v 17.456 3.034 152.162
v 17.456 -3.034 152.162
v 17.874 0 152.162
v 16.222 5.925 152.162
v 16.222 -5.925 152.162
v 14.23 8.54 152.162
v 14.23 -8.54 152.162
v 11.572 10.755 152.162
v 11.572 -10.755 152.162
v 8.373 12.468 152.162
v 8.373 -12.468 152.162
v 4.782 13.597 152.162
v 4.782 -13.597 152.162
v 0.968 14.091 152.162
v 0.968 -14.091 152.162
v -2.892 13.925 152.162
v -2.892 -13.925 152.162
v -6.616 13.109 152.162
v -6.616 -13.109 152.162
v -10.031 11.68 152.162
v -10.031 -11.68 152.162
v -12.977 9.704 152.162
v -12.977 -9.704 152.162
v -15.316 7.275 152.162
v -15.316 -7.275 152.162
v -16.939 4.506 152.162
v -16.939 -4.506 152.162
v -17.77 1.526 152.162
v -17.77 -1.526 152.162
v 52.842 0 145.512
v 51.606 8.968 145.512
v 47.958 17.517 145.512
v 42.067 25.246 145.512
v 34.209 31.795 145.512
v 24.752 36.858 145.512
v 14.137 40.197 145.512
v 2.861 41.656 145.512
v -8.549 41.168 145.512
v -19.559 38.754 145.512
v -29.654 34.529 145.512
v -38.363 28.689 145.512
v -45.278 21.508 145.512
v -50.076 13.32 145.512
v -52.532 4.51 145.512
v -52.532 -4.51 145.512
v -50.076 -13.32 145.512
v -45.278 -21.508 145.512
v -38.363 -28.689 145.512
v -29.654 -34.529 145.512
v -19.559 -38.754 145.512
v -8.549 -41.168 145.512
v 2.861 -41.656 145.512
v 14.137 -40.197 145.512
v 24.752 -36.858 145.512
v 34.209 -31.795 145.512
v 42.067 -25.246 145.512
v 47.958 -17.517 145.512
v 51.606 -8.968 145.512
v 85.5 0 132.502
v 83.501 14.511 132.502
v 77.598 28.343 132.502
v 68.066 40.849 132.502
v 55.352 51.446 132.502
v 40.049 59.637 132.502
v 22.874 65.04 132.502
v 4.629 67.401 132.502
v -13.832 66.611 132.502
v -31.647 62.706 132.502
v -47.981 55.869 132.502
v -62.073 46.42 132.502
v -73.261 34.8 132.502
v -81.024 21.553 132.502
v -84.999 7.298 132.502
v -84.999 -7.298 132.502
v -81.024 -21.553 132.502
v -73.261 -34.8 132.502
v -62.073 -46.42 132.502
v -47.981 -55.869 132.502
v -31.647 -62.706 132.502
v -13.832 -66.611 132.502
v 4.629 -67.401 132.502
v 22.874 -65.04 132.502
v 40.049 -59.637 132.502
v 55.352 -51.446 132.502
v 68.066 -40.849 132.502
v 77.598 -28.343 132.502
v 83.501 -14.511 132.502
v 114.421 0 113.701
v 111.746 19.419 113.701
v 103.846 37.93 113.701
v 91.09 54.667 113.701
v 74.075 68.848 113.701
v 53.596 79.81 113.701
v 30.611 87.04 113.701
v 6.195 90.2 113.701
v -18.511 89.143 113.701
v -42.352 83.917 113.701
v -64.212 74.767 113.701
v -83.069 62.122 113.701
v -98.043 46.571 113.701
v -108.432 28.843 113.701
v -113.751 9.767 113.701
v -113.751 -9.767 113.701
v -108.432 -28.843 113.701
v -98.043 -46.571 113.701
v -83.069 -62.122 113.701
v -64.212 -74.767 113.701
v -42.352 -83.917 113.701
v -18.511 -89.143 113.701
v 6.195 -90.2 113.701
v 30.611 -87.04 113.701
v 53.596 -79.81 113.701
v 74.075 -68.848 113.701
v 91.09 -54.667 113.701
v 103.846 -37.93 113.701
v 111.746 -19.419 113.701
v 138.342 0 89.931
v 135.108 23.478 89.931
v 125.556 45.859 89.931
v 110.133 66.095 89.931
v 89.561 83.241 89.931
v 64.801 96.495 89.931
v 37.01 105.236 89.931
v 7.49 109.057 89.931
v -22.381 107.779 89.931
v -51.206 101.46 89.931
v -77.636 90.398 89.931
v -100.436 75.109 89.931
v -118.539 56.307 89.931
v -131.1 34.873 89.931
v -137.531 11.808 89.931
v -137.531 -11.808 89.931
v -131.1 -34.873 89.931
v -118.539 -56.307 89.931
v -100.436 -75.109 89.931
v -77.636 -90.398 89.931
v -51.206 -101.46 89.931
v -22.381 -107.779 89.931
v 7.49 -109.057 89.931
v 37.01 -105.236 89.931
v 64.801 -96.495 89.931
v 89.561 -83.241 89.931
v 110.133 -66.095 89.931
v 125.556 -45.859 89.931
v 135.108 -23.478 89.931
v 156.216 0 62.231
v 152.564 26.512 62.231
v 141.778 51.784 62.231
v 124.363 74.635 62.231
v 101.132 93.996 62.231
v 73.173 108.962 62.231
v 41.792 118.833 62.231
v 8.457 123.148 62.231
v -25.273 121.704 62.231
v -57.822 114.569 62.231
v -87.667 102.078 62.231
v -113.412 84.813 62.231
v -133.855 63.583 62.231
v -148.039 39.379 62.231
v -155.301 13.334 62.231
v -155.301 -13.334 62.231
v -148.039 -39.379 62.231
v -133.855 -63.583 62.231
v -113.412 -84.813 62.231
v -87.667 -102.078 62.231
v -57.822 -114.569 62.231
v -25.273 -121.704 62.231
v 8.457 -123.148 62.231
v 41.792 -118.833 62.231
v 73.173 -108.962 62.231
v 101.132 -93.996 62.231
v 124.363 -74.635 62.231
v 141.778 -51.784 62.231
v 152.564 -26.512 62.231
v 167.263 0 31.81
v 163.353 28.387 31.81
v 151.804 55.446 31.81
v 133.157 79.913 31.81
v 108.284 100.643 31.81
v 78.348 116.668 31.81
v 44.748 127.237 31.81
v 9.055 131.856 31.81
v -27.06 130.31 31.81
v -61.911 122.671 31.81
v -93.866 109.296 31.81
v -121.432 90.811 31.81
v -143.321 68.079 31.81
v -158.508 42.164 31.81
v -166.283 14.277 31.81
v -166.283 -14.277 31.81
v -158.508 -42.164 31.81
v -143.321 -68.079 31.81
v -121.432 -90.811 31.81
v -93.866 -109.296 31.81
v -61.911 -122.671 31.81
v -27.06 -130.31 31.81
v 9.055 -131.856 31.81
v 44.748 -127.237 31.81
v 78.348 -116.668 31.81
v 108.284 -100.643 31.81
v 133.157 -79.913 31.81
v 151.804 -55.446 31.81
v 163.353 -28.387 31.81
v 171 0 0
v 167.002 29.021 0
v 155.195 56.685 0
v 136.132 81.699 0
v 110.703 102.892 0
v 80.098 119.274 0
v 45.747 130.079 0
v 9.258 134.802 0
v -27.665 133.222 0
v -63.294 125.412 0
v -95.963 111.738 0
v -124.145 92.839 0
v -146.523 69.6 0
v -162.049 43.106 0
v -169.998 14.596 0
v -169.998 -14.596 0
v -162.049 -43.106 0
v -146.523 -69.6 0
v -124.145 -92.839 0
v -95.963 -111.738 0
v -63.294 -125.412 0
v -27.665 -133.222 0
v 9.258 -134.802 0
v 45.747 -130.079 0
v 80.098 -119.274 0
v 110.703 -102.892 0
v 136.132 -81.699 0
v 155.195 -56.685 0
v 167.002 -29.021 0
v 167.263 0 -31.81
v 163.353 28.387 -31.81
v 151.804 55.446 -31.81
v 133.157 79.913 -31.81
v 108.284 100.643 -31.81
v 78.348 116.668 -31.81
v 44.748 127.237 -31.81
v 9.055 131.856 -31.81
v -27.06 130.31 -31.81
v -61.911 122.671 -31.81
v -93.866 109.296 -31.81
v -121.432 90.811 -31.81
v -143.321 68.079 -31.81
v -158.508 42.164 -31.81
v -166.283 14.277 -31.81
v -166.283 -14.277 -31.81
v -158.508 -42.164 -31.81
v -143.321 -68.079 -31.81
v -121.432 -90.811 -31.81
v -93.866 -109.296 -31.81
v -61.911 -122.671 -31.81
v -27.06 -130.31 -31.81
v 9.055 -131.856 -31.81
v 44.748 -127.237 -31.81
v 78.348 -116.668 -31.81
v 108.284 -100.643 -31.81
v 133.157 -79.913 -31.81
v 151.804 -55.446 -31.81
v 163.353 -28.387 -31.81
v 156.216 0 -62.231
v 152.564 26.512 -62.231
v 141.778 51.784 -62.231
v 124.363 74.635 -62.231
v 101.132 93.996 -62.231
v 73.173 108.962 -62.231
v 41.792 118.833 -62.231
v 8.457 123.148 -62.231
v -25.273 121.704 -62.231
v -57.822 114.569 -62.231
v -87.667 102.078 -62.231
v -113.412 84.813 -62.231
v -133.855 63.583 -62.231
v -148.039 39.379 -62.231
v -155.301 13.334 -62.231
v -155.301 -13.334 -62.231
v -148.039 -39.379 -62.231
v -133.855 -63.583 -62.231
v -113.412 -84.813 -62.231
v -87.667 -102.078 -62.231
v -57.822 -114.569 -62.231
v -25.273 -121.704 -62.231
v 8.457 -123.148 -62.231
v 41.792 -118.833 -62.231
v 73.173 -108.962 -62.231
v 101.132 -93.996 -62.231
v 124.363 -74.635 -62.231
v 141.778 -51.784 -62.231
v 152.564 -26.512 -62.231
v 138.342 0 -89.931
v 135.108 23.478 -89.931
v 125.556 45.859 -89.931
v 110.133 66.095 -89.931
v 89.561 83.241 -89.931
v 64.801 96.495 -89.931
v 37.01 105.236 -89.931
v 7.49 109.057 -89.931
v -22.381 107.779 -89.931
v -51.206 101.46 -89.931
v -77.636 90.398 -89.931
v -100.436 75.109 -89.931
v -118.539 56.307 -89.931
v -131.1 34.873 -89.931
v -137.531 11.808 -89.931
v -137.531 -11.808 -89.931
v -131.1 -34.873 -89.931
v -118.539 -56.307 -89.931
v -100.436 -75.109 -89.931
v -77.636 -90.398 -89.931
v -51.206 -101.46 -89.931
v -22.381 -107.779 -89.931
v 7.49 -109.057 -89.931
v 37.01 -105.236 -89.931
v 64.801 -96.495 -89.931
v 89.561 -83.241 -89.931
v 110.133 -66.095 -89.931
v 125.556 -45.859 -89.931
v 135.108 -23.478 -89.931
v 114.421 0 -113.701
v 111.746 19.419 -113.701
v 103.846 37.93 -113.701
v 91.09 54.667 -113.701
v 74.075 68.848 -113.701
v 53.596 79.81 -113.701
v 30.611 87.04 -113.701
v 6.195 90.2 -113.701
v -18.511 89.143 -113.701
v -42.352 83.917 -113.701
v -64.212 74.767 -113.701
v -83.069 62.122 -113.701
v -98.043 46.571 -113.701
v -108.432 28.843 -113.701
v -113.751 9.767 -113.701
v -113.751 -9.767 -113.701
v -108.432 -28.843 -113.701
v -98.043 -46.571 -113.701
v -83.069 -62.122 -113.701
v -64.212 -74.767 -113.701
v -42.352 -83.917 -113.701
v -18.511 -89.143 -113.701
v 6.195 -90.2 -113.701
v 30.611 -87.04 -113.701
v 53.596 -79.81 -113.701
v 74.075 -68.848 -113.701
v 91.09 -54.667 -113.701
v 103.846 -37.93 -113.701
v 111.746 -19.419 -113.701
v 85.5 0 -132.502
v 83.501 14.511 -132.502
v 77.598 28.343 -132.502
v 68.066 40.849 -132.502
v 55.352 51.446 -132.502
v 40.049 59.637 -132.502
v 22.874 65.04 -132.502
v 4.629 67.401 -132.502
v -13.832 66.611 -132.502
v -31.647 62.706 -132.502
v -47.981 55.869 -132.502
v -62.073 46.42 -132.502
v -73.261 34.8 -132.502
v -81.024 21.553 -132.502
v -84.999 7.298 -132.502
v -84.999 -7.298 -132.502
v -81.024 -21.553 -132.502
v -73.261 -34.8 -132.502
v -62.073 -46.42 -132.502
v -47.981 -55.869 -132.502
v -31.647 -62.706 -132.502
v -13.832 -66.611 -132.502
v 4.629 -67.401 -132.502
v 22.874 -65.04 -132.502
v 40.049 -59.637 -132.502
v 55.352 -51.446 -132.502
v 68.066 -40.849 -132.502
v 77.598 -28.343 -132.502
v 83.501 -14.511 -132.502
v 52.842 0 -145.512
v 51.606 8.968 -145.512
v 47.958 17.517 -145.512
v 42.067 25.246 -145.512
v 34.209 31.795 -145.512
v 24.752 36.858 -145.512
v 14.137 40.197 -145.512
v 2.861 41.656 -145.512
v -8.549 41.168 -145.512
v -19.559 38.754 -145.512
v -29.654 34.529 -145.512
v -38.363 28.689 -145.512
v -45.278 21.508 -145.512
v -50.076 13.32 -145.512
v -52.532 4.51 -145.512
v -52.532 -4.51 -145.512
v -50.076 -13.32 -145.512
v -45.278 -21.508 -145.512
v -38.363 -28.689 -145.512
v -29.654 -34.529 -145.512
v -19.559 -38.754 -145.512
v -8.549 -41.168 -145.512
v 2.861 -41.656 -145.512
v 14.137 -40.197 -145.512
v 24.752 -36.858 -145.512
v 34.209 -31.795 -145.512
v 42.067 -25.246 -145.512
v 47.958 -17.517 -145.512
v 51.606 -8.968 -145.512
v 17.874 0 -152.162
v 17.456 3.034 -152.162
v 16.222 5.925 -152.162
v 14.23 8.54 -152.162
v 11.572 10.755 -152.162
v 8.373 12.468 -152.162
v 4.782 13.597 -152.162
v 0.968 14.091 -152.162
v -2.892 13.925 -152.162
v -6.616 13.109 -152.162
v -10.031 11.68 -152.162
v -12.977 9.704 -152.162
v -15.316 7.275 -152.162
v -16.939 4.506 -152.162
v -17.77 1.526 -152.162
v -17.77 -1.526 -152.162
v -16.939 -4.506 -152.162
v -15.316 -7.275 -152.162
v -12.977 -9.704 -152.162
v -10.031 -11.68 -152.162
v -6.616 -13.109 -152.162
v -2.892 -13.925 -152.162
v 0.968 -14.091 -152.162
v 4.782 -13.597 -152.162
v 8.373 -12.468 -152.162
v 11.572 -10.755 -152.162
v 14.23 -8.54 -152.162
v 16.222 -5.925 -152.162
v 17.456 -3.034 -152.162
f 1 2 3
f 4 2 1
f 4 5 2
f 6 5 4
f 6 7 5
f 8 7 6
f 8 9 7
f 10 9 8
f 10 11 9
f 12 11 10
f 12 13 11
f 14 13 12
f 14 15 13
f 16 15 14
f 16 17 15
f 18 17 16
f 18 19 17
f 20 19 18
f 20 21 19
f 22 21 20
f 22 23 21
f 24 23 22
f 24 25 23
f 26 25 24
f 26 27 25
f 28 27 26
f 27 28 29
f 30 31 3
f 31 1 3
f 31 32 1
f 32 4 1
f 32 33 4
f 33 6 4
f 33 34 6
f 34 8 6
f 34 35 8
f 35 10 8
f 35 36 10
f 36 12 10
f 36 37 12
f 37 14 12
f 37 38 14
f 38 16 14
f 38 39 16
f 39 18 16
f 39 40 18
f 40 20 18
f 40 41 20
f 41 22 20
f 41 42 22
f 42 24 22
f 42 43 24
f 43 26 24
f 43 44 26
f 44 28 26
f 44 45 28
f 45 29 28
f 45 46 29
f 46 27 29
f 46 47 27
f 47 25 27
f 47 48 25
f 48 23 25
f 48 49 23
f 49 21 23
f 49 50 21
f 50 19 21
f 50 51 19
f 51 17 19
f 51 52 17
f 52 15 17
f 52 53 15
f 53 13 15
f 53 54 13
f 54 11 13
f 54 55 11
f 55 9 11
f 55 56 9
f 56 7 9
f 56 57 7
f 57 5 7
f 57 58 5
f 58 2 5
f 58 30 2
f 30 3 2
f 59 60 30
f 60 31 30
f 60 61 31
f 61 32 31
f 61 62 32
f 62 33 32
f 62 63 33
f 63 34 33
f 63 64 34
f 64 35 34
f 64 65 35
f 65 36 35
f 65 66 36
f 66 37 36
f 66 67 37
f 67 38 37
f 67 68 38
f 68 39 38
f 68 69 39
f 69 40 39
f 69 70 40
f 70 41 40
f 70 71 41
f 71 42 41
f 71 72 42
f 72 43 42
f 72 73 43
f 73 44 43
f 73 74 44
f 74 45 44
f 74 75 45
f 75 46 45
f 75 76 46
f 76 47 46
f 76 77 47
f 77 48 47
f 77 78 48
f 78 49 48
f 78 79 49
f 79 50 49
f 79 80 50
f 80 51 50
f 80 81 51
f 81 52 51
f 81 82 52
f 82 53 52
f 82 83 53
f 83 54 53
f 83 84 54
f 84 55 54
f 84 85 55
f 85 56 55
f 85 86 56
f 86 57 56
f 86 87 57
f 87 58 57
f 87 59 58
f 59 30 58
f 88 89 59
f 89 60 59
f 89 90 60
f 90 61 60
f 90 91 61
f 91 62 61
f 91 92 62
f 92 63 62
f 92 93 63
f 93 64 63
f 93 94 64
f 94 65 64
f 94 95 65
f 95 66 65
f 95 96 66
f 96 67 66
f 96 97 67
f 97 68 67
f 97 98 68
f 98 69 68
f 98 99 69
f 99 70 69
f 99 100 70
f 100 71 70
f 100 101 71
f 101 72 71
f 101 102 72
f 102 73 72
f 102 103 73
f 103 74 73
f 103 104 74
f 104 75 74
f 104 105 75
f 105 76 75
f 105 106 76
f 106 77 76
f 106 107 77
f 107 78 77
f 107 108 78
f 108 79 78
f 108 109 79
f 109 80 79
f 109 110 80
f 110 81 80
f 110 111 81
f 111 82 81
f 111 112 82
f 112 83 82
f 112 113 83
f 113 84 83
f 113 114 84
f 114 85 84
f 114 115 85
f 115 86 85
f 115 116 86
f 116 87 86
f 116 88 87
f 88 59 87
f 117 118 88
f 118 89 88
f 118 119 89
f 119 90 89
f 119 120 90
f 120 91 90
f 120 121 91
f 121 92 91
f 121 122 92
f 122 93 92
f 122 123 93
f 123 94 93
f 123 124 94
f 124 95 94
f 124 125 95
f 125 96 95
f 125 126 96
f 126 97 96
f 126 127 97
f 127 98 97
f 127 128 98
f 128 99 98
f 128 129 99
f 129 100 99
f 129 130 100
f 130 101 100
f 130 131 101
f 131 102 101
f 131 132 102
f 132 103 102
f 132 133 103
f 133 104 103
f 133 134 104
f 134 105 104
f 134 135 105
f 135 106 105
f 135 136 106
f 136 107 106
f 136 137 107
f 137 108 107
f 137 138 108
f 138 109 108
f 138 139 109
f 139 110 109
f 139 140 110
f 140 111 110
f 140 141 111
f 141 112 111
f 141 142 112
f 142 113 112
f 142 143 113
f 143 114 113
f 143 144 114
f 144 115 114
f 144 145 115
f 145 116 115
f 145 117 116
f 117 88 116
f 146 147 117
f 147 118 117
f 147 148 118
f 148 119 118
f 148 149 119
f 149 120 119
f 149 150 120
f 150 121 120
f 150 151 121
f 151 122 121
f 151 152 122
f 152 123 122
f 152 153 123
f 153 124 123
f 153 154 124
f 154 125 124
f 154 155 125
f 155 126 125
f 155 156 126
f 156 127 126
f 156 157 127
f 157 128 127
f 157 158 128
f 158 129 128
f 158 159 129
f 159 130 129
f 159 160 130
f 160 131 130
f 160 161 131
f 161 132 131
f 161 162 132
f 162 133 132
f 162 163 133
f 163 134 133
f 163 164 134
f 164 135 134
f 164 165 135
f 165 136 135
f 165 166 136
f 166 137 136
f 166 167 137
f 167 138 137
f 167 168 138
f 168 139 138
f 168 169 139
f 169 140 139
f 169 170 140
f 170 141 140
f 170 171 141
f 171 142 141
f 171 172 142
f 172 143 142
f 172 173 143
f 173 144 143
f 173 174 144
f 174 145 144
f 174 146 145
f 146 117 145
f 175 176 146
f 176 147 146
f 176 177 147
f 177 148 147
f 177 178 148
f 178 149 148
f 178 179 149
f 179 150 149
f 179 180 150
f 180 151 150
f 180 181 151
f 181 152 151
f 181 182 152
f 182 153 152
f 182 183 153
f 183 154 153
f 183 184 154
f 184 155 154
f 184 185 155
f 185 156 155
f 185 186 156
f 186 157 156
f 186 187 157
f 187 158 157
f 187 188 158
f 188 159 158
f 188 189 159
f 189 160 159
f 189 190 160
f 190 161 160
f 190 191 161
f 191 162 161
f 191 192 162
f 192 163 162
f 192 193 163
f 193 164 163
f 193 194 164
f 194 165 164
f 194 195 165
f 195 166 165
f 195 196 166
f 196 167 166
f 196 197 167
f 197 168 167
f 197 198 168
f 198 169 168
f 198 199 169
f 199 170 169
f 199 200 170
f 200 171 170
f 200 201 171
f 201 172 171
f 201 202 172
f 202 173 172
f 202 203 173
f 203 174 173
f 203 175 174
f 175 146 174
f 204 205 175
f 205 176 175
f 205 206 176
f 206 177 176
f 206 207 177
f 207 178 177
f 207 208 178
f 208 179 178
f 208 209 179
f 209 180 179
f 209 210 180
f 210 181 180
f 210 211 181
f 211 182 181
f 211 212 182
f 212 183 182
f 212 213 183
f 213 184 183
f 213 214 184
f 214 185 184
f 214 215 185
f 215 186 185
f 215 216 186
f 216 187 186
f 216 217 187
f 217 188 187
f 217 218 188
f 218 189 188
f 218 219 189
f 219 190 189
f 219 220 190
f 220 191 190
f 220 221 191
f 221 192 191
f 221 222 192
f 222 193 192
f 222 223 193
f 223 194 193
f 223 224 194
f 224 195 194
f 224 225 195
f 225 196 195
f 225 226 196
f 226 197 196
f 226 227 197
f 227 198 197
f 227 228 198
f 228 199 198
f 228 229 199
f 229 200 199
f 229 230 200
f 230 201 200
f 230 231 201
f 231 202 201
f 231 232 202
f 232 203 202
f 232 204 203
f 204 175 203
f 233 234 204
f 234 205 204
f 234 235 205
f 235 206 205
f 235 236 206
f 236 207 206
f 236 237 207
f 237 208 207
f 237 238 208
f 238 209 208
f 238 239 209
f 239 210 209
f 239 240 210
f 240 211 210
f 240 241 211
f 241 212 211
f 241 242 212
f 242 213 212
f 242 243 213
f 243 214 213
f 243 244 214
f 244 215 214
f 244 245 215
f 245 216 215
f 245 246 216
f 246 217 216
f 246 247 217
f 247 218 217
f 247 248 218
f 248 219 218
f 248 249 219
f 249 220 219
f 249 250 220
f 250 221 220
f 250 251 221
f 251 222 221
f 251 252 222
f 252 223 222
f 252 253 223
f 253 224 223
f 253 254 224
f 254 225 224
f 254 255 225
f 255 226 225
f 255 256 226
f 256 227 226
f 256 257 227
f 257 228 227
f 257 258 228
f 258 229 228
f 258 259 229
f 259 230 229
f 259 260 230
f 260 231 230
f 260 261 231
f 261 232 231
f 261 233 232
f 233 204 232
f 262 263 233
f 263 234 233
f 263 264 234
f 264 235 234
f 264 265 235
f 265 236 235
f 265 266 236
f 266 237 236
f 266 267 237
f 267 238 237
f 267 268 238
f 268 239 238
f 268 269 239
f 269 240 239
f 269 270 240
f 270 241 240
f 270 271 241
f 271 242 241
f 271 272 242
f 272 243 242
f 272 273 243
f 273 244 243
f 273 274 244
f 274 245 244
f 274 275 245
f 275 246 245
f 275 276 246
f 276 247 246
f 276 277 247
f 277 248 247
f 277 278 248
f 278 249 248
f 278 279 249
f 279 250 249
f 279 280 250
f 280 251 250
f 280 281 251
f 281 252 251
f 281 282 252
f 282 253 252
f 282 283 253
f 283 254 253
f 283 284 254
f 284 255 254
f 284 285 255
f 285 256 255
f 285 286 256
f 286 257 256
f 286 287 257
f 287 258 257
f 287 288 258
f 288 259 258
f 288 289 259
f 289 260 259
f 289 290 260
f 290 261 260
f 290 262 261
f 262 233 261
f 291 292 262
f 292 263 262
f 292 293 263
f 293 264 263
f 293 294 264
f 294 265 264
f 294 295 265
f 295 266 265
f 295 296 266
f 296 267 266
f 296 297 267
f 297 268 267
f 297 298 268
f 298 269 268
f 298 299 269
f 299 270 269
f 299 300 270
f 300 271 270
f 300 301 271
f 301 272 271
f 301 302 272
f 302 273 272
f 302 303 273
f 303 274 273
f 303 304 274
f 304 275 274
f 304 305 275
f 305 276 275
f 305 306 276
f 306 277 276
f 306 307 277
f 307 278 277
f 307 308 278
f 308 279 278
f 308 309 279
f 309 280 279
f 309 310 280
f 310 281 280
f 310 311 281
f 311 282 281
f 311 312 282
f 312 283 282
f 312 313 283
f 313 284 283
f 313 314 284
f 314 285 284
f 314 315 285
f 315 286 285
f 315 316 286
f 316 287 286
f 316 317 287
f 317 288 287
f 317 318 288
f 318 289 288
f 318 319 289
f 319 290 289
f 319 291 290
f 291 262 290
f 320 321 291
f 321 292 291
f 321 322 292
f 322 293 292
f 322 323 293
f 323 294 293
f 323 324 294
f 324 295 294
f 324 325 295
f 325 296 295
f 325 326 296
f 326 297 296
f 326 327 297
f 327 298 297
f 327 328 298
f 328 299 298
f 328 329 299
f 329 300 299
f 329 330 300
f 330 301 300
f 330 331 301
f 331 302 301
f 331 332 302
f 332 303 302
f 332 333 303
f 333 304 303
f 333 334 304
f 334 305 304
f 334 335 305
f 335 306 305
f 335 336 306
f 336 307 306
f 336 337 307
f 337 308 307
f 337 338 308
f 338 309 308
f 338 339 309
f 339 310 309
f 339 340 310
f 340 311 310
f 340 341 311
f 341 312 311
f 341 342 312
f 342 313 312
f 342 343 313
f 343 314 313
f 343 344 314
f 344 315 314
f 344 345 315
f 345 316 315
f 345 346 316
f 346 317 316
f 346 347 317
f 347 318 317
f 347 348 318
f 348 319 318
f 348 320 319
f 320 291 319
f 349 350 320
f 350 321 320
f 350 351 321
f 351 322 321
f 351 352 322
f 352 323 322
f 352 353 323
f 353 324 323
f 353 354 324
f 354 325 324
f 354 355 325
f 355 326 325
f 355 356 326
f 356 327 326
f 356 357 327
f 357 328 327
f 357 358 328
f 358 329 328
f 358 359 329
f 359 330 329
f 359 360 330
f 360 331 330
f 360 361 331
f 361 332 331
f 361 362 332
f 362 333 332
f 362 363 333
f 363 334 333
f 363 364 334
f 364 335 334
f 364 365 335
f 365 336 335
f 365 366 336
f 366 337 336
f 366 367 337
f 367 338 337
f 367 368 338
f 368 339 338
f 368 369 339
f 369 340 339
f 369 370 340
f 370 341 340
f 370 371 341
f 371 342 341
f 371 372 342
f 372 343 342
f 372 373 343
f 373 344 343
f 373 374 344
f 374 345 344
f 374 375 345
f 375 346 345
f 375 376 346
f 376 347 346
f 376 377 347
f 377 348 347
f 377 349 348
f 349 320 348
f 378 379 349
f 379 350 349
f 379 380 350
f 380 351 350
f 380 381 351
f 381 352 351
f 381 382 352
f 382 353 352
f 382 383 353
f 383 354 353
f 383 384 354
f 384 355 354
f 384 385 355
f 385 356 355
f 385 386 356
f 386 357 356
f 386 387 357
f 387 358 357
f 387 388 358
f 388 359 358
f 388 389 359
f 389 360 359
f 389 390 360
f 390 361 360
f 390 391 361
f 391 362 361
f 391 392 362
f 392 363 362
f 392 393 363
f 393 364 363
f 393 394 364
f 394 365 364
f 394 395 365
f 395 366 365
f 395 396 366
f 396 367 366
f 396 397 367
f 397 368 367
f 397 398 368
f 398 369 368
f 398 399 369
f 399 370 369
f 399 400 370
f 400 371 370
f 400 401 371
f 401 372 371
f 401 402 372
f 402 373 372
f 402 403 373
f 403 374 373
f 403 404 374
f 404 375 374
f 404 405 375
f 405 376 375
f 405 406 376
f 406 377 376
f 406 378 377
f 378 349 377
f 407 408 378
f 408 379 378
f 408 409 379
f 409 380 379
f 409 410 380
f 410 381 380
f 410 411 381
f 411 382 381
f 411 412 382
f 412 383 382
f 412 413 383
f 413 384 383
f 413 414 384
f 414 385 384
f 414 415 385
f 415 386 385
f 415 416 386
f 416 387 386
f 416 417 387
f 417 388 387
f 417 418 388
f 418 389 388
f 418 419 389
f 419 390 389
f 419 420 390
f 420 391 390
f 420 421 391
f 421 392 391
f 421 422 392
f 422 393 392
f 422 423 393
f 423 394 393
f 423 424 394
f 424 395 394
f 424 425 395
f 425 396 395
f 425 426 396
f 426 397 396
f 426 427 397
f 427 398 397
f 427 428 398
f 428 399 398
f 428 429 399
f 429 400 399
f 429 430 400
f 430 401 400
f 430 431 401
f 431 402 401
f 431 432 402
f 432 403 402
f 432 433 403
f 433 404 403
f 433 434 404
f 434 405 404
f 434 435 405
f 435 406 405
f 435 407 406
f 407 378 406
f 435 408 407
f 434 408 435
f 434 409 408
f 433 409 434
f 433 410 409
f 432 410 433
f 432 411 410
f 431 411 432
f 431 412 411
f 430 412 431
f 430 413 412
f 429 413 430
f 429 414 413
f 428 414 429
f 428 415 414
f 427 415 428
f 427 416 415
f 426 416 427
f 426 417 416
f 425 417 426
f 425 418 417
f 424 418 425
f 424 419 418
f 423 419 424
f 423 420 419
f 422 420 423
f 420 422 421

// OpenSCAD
// Generated by SolidPython 1.0.1 on 2020-07-29 00:46:54


scale(v = [19, 15, 17]) {
	sphere(r = 9);
}
/***********************************************
*********      SolidPython code:      **********
************************************************
 
# import packages: SolidPython
from solid import *
from solid.utils import *
from itertools import chain, combinations, permutations


class Resize:

    def __init__(self, scad_file):
        self.scad_file = scad_file
        #self.scad_file = import_scad(scad_file)
        # cone/cylinder param:
        self.r1 = 0
        self.r2 = 0
        self.h = 0
        # rectangular prism param:
        self.w = 0
        self.l = 0
        # ellipse param:
        self.r = 0

    # import OpenScad code (file name corresponds to shape)


    # classify shape + parameters
    def assign(self, param1, param2, param3):
        if self.scad_file == 'cone.scad':
            self.r1 = param1
            self.r2 = param2
            self.h = param3
        elif self.scad_file == 'cylinder.scad':
            self.r1 = param1
            self.r2 = param2
            self.h = param3
        elif self.scad_file == 'rectangularPrism.scad':
            self.h = param1
            self.l = param2
            self.w = param3
        else:
            self.r = param1
            self.h = param2

    # resize parameters
    def iterate(self):
        x = range(3, 20, 2)
        i = 1
        if self.scad_file == 'cone.scad':
            tempList = list(permutations(x, 2))
            for temp in tempList:
                param1 = temp[0]
                param2 = temp[1]
                filepath = 'produced_scad_files/' + 'cone' + str(param1) + '_' + str(param2) + '_' + '.scad'
                scad_render_to_file(cylinder(h=param1, r1=param2, r2=0), filepath)

        elif self.scad_file == 'cylinder.scad':
            tempList = list(permutations(x, 3))
            for temp in tempList:
                param1 = temp[0]
                param2 = temp[1]
                filepath = 'produced_scad_files/' + 'cylinder' + str(param1) + '_' + str(param2) + '_' + '.scad'
                scad_render_to_file(cylinder(h=param1, r1=param2, r2=param2), filepath)

        elif self.scad_file == 'rectangularPrism.scad':
            tempList = list(permutations(x, 3))
            for temp in tempList:
                param1 = temp[0]
                param2 = temp[1]
                param3 = temp[2]
                filepath = 'produced_scad_files/' + 'rectangularPrism' + str(param1) + '_' + str(param2) + '_' + str(
                    param3) + '.scad'
                scad_render_to_file(cube(size=(param1, param2, param3)), filepath)

        elif self.scad_file == 'ellipse.scad':
            tempList = list(permutations(x, 4))
            for temp in tempList:
                param1 = temp[0]
                param2 = temp[1]
                param3 = temp[2]
                param4 = temp[3]
                filepath = 'produced_scad_files/' + 'ellipse' + str(param1) + '_' + str(param2) + '_' + str(param3) + '_' + str(param4) + '.scad'
                scad_render_to_file(scale([param1, param2, param3])(sphere(r=param4)), filepath)

    def render_to_scadfile(self):
        scad_render_to_file(scad, 'example.scad') 
 
************************************************/
